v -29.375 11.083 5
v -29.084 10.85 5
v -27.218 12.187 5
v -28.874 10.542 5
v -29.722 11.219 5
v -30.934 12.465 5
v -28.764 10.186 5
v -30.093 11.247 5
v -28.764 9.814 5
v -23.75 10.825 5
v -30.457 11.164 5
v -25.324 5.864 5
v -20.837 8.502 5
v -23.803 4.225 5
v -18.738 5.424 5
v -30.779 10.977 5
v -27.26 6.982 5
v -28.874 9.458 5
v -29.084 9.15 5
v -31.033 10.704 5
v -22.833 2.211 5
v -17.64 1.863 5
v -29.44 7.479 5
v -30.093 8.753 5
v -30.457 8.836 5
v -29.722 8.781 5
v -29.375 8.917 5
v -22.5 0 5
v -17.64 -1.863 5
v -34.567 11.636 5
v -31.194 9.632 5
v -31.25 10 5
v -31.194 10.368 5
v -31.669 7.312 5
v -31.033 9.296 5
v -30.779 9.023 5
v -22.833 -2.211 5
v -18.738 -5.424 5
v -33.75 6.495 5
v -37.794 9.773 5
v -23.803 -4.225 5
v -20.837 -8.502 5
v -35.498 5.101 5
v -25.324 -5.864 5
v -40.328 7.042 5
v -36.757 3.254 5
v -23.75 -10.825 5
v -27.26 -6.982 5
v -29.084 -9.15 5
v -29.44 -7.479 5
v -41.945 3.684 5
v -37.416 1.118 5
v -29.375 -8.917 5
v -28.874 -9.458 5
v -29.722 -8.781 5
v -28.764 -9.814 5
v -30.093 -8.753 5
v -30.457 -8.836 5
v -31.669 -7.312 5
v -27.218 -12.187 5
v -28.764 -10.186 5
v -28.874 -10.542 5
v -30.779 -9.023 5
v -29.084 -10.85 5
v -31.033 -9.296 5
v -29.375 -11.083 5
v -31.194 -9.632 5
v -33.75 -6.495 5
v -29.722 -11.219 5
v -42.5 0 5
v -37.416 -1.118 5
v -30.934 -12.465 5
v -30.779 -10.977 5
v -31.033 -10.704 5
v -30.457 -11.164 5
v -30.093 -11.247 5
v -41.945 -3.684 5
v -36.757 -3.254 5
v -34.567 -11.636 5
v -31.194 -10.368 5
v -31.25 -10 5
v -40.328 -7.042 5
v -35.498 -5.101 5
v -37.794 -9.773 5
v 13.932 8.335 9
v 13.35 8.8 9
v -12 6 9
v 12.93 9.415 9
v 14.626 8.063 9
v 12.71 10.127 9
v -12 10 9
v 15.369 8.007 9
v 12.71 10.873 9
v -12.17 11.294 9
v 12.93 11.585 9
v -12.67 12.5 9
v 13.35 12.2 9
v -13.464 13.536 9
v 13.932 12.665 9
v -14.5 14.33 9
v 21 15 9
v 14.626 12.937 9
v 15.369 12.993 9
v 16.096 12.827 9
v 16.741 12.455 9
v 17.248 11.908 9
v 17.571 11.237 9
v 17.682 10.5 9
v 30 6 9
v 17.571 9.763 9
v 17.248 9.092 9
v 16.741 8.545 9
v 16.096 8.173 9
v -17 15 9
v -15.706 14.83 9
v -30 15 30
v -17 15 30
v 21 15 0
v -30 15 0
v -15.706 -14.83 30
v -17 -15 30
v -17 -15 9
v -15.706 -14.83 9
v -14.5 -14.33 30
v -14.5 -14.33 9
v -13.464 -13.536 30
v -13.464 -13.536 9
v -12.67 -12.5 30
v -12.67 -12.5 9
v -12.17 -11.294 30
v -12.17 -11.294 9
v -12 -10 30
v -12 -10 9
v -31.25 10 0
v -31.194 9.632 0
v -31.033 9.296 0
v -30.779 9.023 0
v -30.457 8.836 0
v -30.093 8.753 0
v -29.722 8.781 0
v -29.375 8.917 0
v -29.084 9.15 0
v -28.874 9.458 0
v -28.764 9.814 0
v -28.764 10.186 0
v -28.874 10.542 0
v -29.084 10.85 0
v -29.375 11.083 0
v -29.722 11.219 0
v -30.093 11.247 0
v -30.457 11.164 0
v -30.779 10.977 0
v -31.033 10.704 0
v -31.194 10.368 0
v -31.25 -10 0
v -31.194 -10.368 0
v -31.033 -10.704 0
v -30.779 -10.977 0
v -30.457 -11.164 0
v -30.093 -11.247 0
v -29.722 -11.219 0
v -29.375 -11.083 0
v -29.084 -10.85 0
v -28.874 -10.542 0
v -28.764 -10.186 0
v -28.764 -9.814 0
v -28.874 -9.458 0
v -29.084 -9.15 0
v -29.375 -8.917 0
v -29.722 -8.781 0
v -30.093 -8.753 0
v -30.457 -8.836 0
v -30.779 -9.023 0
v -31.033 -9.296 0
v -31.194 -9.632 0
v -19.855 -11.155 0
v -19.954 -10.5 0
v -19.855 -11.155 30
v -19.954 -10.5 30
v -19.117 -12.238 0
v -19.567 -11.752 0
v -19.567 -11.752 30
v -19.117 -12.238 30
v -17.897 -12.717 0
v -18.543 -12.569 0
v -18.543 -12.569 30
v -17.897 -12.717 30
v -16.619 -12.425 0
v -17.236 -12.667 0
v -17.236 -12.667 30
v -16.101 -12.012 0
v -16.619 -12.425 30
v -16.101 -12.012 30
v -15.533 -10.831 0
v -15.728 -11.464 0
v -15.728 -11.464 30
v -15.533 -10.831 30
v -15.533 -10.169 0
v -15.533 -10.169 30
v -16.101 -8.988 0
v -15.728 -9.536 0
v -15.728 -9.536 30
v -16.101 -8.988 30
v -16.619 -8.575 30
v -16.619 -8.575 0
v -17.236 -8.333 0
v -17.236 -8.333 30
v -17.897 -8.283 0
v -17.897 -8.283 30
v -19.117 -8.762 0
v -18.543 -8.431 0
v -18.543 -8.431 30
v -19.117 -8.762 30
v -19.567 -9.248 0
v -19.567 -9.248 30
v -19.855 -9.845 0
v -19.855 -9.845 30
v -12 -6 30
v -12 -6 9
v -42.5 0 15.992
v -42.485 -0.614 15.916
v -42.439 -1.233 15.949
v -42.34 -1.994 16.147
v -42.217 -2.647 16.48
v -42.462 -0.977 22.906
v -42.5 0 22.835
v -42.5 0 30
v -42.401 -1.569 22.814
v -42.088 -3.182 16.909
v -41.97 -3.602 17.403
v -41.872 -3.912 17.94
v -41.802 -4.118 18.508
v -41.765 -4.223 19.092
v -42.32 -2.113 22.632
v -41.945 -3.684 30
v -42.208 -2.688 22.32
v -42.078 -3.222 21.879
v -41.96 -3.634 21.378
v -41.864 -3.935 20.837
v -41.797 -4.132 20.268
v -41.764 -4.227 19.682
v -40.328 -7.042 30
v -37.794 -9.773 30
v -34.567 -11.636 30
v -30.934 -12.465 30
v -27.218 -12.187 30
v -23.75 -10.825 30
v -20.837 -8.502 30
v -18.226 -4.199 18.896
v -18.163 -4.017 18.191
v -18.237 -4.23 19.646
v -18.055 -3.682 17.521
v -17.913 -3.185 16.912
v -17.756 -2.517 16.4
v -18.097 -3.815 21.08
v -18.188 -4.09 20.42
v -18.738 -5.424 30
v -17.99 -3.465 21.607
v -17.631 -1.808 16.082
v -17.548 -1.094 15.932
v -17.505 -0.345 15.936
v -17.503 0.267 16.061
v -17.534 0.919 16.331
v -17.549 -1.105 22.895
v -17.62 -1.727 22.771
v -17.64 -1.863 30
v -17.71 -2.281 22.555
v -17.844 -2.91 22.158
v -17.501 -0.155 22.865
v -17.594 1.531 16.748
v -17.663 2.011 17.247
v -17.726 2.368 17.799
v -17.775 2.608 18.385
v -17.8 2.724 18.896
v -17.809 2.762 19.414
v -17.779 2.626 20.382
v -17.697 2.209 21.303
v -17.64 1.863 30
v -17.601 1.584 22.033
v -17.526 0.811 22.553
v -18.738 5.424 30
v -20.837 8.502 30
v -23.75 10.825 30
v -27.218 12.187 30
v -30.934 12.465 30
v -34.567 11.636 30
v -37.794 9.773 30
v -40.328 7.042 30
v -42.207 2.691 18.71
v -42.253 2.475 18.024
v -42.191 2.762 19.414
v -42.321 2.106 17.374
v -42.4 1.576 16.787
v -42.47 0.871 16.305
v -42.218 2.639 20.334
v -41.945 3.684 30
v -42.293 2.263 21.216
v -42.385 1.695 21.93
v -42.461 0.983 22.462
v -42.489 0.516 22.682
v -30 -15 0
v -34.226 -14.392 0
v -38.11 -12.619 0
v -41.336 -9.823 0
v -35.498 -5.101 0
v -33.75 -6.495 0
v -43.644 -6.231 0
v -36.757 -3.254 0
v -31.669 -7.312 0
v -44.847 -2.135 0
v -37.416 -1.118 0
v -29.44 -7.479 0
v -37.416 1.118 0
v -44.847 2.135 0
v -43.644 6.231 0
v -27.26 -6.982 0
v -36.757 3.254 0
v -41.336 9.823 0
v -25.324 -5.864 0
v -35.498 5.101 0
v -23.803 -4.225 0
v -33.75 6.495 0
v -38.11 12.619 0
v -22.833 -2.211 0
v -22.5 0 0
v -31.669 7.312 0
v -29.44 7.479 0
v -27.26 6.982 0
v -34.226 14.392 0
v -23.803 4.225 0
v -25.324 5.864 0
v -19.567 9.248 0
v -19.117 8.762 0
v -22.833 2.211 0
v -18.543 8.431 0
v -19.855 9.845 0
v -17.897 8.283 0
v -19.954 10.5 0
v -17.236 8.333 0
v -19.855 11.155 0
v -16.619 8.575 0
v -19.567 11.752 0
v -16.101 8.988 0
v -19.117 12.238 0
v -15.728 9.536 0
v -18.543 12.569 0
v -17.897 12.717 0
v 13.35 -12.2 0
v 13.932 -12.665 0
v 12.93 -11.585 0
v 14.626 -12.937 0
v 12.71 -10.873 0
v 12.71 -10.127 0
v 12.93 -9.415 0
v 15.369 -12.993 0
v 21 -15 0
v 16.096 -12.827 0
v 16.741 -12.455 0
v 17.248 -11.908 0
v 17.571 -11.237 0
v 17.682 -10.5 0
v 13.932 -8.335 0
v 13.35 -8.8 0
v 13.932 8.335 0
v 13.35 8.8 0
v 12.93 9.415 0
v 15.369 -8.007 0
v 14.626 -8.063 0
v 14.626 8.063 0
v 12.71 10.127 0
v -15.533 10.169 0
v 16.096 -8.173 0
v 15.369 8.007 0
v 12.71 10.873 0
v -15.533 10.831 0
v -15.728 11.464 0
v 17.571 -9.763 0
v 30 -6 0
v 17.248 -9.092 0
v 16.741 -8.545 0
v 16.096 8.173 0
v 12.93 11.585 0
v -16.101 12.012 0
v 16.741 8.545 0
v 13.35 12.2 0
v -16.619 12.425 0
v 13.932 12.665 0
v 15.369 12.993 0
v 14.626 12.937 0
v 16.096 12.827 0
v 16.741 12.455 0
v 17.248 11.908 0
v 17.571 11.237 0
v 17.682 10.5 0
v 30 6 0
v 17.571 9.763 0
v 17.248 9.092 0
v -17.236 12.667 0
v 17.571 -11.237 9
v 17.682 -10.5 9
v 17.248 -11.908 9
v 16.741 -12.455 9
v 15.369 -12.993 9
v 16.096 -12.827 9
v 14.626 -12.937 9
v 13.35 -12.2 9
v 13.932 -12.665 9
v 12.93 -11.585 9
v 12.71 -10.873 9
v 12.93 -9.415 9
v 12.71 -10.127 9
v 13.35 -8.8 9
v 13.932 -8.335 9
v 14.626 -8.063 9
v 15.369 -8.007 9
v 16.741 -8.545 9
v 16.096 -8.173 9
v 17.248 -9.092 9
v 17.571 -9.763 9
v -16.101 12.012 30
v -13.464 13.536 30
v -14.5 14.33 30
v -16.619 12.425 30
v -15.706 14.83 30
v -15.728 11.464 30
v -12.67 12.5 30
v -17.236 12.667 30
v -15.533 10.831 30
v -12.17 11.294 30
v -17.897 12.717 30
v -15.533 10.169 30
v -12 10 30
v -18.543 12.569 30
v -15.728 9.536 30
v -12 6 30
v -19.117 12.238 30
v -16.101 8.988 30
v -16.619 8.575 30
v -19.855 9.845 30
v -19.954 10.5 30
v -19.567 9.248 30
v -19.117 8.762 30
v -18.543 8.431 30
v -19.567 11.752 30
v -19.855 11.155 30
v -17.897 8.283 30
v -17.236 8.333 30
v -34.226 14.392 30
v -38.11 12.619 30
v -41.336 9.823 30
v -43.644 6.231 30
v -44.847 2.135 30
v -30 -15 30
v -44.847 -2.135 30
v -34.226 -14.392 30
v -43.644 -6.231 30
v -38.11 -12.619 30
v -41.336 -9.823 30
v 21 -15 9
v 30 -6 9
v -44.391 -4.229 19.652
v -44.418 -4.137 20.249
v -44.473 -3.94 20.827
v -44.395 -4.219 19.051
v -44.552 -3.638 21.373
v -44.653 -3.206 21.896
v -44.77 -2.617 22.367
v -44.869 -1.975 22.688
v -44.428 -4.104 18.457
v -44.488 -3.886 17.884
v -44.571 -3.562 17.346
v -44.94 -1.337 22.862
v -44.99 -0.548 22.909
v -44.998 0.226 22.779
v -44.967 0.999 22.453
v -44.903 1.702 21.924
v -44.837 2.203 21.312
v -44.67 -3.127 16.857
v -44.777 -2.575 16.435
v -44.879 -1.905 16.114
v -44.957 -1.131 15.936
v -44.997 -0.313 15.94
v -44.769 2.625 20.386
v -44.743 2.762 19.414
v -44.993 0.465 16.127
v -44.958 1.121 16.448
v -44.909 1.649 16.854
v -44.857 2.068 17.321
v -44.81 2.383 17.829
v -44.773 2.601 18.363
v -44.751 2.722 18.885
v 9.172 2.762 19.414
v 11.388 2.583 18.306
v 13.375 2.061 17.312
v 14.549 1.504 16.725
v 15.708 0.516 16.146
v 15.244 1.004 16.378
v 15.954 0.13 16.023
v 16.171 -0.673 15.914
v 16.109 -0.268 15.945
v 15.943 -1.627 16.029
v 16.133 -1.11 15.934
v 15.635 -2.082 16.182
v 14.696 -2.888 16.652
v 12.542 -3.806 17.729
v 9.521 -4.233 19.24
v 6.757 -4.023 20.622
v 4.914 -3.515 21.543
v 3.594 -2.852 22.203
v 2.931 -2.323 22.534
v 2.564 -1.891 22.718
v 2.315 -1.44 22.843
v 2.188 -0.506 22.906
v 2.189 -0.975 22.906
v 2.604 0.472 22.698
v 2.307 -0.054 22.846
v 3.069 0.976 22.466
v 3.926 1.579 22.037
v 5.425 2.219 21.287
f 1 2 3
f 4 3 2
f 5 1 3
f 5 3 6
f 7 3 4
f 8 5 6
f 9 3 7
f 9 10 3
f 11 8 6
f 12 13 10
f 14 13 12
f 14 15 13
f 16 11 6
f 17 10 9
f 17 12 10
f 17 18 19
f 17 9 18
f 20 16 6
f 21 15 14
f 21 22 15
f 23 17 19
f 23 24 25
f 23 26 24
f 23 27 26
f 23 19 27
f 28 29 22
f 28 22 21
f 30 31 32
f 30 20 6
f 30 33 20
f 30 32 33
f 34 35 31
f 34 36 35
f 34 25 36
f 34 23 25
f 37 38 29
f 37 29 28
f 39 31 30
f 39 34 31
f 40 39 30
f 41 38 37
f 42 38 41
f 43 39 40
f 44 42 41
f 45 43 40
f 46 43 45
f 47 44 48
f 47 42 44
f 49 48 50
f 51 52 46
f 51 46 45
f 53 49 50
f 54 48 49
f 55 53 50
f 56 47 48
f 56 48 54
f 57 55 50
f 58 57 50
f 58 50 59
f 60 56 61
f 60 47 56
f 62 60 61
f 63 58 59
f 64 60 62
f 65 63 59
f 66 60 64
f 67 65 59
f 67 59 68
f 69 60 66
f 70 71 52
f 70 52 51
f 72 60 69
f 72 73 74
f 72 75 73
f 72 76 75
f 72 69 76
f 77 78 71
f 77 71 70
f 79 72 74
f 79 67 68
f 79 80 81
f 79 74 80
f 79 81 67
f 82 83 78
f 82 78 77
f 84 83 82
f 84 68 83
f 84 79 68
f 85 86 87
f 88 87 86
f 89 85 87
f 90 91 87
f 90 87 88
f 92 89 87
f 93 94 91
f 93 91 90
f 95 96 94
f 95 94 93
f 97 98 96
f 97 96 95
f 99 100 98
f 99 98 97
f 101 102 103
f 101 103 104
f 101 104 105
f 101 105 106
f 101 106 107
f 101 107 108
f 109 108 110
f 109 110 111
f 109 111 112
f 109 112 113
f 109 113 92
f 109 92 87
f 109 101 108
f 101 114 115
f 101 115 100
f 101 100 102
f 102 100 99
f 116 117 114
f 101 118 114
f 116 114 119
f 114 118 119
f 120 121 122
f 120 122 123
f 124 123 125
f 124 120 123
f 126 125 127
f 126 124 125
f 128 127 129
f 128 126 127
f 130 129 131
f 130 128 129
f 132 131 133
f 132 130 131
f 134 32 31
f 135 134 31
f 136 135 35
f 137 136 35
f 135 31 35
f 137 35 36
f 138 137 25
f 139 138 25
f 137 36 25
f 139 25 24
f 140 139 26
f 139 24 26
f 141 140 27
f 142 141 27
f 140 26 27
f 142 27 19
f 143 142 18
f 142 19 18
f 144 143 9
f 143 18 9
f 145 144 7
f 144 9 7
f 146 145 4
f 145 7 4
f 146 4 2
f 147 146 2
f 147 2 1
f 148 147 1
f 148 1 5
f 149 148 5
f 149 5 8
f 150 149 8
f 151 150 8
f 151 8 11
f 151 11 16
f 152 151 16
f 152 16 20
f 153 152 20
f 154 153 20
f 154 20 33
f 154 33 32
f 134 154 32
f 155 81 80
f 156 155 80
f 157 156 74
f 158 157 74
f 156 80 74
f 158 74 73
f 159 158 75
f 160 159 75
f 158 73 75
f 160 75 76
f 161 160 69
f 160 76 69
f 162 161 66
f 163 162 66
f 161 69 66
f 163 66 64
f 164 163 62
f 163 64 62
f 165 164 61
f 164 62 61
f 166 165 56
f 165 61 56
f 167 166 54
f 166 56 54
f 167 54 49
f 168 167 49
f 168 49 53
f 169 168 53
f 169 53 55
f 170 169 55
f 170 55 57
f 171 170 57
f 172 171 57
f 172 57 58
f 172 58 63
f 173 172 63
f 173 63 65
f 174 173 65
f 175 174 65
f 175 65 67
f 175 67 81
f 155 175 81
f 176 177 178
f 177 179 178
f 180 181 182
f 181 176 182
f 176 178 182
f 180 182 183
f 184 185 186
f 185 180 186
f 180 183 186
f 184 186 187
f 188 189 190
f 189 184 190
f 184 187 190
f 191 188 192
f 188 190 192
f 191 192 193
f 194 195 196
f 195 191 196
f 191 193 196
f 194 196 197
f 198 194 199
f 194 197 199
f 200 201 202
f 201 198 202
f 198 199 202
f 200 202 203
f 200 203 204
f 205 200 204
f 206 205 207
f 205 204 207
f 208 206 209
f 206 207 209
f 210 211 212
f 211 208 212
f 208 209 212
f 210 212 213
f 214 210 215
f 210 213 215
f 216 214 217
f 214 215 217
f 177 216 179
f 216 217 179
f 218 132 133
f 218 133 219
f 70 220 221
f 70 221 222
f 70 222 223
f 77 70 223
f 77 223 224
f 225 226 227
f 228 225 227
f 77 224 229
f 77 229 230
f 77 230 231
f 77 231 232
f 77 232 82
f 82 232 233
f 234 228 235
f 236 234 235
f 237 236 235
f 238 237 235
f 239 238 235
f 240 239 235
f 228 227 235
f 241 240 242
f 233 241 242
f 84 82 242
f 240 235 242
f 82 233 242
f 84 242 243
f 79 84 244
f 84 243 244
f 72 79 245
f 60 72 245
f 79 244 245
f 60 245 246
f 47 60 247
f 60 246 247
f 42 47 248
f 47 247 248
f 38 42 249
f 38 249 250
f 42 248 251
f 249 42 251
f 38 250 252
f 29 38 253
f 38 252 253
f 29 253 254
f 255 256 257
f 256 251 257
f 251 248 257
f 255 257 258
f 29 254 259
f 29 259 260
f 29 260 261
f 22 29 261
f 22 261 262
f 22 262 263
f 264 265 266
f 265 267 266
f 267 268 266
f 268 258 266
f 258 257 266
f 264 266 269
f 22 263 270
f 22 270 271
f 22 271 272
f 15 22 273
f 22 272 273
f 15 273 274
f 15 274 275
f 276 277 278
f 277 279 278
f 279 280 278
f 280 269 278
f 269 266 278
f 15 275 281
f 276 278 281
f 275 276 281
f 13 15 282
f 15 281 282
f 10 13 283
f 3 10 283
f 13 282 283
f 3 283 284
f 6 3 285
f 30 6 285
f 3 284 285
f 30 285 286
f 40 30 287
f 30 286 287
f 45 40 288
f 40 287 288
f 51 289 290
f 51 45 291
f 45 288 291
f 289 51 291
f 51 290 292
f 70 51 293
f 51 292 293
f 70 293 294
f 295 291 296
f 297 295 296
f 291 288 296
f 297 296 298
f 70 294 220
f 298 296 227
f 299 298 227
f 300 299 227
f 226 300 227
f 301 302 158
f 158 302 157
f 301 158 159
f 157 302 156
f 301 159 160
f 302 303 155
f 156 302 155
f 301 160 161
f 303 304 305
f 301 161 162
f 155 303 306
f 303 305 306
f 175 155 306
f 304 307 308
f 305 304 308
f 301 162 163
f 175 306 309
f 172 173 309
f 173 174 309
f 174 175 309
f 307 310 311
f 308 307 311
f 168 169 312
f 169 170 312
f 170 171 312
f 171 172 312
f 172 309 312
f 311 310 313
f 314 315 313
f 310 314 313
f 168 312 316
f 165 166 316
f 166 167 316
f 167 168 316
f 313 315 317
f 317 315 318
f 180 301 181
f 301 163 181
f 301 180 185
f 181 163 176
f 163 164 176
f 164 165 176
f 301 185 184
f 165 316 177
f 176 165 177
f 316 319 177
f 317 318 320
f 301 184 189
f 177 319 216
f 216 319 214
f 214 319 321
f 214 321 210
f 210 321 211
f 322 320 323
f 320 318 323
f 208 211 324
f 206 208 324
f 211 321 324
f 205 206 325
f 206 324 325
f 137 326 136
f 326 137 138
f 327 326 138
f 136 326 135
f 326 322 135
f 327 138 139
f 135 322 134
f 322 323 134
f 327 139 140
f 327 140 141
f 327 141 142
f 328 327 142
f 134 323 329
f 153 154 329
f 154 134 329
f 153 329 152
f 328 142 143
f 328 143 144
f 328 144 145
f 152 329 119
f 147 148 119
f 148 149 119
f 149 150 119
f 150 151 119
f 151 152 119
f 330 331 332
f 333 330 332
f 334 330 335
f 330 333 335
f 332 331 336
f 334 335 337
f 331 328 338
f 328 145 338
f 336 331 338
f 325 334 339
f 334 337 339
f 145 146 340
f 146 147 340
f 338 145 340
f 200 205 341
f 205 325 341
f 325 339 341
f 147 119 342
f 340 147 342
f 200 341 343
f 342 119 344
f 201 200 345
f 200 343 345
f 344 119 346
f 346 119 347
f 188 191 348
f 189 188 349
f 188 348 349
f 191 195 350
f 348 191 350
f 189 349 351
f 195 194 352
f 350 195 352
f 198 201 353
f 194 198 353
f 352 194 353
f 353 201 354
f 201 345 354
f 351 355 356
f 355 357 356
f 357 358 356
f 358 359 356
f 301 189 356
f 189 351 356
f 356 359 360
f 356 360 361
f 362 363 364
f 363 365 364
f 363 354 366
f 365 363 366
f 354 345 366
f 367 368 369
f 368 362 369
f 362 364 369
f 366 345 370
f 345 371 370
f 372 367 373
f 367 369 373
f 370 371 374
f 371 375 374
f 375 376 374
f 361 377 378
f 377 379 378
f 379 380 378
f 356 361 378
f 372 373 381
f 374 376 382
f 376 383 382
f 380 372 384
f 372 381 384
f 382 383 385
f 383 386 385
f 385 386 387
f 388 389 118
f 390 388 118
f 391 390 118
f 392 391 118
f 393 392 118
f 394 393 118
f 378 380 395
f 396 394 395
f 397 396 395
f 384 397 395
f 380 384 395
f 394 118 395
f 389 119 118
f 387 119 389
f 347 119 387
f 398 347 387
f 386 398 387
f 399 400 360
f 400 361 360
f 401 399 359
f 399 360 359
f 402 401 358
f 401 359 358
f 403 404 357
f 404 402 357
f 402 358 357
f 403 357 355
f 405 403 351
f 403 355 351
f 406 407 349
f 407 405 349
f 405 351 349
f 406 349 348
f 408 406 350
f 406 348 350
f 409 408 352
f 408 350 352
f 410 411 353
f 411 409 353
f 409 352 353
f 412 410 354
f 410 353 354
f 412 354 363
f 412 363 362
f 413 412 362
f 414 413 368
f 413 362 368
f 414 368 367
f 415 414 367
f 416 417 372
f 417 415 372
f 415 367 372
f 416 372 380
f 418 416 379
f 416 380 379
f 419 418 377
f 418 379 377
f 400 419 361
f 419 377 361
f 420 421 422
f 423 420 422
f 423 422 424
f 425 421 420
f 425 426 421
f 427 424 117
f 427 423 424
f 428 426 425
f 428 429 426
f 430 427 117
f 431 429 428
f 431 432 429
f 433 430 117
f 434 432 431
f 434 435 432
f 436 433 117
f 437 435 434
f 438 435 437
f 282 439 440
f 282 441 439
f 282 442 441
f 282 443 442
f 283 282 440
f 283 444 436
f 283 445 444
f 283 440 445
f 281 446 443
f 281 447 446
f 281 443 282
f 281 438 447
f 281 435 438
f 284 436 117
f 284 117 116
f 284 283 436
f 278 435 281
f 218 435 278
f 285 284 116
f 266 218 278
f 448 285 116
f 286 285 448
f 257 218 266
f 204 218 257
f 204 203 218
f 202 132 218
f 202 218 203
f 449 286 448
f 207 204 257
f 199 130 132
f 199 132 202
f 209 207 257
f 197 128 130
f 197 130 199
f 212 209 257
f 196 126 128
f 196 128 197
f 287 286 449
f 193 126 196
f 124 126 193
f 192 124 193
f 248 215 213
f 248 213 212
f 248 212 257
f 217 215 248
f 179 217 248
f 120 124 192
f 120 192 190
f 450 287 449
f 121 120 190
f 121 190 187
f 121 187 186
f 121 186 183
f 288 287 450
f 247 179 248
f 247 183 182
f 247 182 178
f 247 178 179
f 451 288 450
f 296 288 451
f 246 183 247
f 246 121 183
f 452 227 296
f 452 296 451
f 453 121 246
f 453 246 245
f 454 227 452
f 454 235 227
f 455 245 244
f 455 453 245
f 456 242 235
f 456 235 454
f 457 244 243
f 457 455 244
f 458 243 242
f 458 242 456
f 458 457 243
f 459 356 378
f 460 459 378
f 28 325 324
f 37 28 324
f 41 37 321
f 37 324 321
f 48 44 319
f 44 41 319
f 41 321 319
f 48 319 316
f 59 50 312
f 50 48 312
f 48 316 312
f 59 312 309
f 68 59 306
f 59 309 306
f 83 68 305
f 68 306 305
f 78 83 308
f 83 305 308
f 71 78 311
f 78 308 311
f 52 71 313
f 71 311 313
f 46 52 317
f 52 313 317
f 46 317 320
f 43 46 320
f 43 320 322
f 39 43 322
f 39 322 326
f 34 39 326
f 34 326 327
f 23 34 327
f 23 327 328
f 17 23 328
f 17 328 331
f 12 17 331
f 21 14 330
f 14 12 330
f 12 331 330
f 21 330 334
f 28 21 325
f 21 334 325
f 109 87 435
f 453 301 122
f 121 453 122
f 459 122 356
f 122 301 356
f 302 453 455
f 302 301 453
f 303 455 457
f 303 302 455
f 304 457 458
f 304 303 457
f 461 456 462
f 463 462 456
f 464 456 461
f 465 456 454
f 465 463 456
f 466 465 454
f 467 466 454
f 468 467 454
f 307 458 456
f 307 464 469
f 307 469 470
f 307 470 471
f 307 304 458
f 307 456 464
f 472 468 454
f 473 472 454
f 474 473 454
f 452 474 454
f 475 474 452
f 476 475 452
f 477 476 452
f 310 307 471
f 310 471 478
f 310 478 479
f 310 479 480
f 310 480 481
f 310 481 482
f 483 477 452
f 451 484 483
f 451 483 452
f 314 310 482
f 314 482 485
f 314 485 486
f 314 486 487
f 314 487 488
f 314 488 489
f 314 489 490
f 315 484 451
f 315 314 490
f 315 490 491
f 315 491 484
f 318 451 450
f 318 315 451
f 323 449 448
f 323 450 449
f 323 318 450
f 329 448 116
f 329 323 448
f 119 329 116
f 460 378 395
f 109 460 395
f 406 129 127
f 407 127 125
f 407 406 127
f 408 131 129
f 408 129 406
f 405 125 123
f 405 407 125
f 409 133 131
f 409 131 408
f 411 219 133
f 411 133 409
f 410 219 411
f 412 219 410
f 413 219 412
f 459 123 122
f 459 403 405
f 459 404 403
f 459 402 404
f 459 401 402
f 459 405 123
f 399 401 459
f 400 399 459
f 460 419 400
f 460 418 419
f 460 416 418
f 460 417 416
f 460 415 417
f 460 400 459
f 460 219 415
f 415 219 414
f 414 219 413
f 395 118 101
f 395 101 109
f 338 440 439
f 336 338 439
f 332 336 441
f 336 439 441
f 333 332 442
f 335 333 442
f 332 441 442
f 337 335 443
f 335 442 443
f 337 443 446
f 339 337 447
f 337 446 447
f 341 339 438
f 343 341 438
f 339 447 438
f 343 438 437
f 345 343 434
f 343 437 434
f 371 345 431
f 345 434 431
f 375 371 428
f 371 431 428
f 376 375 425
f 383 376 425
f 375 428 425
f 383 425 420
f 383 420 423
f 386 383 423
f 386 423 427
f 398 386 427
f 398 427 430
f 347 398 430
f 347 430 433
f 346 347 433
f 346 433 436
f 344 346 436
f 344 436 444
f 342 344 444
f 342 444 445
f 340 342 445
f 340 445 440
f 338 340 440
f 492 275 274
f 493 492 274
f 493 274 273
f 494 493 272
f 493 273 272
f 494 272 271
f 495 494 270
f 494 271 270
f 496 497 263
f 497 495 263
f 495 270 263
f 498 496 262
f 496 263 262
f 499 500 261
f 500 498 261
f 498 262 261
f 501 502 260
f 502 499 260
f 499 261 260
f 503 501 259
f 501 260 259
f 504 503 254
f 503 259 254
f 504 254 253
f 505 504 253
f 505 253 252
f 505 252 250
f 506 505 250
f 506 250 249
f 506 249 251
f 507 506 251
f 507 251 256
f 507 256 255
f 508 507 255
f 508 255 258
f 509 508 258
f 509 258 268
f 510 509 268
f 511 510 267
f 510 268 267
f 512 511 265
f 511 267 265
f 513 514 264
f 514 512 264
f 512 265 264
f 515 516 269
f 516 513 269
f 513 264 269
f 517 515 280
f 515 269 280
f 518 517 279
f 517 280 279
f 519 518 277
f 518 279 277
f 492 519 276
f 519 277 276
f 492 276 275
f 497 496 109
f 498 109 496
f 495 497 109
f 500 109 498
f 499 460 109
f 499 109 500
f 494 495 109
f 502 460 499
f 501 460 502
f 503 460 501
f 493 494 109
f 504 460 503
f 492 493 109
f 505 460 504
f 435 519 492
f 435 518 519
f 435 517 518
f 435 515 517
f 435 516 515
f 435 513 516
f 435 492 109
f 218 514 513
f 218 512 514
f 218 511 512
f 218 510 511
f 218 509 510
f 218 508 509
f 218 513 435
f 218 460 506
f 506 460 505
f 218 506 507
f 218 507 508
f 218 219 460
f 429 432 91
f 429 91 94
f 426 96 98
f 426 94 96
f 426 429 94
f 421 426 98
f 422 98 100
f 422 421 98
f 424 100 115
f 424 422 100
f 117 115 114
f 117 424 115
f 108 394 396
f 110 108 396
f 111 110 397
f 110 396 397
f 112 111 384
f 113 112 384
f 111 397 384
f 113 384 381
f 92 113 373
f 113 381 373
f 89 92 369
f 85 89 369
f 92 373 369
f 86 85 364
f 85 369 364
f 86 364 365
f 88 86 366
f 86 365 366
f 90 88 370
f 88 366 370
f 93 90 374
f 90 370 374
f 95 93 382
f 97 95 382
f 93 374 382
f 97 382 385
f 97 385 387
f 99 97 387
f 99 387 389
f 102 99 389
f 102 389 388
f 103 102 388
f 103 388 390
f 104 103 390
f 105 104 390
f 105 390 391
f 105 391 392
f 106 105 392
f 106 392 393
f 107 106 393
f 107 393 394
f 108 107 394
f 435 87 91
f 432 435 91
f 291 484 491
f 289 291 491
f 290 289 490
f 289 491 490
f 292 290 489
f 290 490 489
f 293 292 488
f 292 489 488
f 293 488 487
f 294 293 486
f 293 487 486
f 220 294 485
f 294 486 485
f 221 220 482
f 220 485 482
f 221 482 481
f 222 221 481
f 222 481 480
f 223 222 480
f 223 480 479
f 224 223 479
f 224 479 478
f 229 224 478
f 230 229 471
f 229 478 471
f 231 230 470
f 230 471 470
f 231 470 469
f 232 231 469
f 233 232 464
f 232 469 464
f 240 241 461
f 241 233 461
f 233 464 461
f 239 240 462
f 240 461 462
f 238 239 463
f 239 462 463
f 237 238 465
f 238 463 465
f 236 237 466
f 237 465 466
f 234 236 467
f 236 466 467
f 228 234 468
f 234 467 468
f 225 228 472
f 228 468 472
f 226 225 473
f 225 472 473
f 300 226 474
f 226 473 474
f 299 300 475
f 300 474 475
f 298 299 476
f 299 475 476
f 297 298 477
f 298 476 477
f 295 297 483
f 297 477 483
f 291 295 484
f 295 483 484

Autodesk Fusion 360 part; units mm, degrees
sketch "Sketch1" plane through (0, 0, 0) normal (0, 1, 0) x (1, 0, 0)
sketch "Sketch2" plane through (0, 0, 0) normal (0, 0, 1) x (1, 0, 0)
  line L0 (30, 15) -> (-30, 15)
  line L1 (-30, 15) -> (-30, -15)
  line L2 (-30, -15) -> (30, -15)
  line L3 (30, -15) -> (30, 15)
  line L4 (30, 15) -> (-30, -15) construction
  line L5 (-30, 15) -> (30, -15) construction
  arc A0 (-30, 15) -> (-30, -15) centre (-30, 0) ccw
  circle A1 centre (-30, 0) radius 7.5
  line L6 (21, -15) -> (30, -6)
  line L7 (21, 15) -> (30, 6)
  dimension "d1" = 60
  dimension "d2" = 30
  dimension "d3" = 15
  dimension "d4" = 9
  dimension "d5" = 9
  dimension "d6" = 9
  dimension "d7" = 9
extrude "Extrude1" add sketch "Sketch2" along normal blind 9 contours L0 L1 L2 L3 A1 L6 L7 | L1 A0 A1
sketch "Sketch3" plane through (0, 0, 9) normal (0, 0, 1) x (-1, 0, 0)
  circle A0 centre (30, 0) radius 7.5
  arc A1 (30, -15) -> (30, 15) centre (30, 0) ccw
  line L0 (30, 15) -> (-21, 15)
  line L1 (-21, 15) -> (-30, 6)
  line L2 (-30, 6) -> (-30, -6)
  line L3 (-30, -6) -> (-21, -15)
  line L4 (-21, -15) -> (30, -15)
  line L5 (12, 15) -> (12, -15)
  dimension "d10" = 18
extrude "Extrude2" add sketch "Sketch3" along normal blind 21 contours A1 L0 L4 L5
sketch "Sketch4" plane through (0, 0, 0) normal (0, 1, 0) x (1, 0, 0)
  line L0 (30, -9) -> (-12, -30)
  line L1 (-12, -30) -> (-12, -9)
  line L2 (-12, -9) -> (30, -9)
extrude "Extrude3" add sketch "Sketch4" along normal mid plane 12
sketch "Sketch5" plane through (0, 0, 30) normal (0, 0, 1) x (-1, 0, 0)
  circle A0 centre (30, 0) radius 7.5
  line L0 (12, 15) -> (12, 6)
  line L1 (12, 6) -> (12, -6)
  line L2 (12, -6) -> (12, -15)
  line L3 (12, -15) -> (30, -15)
  arc A1 (30, -15) -> (30, 15) centre (30, 0) ccw
  line L4 (30, 15) -> (12, 15)
  circle A2 centre (17.7307, -10.5) radius 2.2228
  circle A3 centre (17.7307, -10.5) radius 2.5
  dimension "d15" = 5
extrude "Extrude4" cut sketch "Sketch5" against normal blind 30 contours A2
mirror "Mirror1" about plane through (0, 0, 0) normal (0, 1, 0) of "Extrude4"
sketch "Sketch6" plane through (0, 0, 30) normal (0, 0, 1) x (-1, 0, 0)
  circle A0 centre (17.7307, 10.5) radius 2.2228
  circle A1 centre (17.7307, -10.5) radius 2.2228
  circle A2 centre (30, 0) radius 7.5
  line L0 (12, 15) -> (12, 6)
  line L1 (12, 6) -> (12, -6)
  line L2 (12, -6) -> (12, -15)
  line L3 (12, -15) -> (30, -15)
  arc A3 (30, -15) -> (30, 15) centre (30, 0) ccw
  line L4 (30, 15) -> (12, 15)
  circle A4 centre (30, 0) radius 12.5
  dimension "d20" = 25
extrude "Extrude5" cut sketch "Sketch6" against normal blind 25 contours A4
sketch "Sketch7" plane through (0, 0, 5) normal (0, 0, 1) x (-1, 0, 0)
  circle A0 centre (30, 0) radius 7.5
  circle A1 centre (30, 0) radius 12.5
  circle A2 centre (30, 10) radius 1.25
  dimension "d23" = 2.5
extrude "Extrude6" cut sketch "Sketch7" against normal blind 5 contours A2
sketch "Sketch8" plane through (0, 0, 5) normal (0, 0, 1) x (-1, 0, 0)
  circle A0 centre (30, 10) radius 1.25
  circle A1 centre (30, 0) radius 7.5
  circle A2 centre (30, 0) radius 12.5
  circle A3 centre (30, -10) radius 1.25
  dimension "d26" = 2.5
extrude "Extrude7" cut sketch "Sketch8" against normal blind 5 contours A3
sketch "Sketch9" plane through (0, 0, 0) normal (0, 0, -1) x (1, 0, 0)
  circle A0 centre (-30, -10) radius 1.25
  circle A1 centre (-30, 10) radius 1.25
  circle A2 centre (-17.7307, 10.5) radius 2.2228
  circle A3 centre (-17.7307, -10.5) radius 2.2228
  circle A4 centre (-30, 0) radius 7.5
  arc A5 (-30, 15) -> (-30, -15) centre (-30, 0) ccw
  line L0 (-30, -15) -> (21, -15)
  line L1 (21, -15) -> (30, -6)
  line L2 (30, -6) -> (30, 6)
  line L3 (30, 6) -> (21, 15)
  line L4 (21, 15) -> (-30, 15)
  circle A6 centre (15.1822, -10.5) radius 2.5
  circle A7 centre (15, 10) radius 2.5
  dimension "d29" = 5
  dimension "d30" = 5
extrude "Extrude8" cut sketch "Sketch9" against normal blind 9 contours A6
mirror "Mirror2" about plane through (0, 0, 0) normal (0, 1, 0) of "Extrude8"
sketch "Sketch10" plane through (0, 0, 0) normal (0, 0, 1) x (1, 0, 0)
fillet "Fillet1" radius 5 1 edges at (-12, 15, 19.5)
fillet "Fillet2" radius 5 1 edges at (-12, -15, 19.5)
ref_plane "WorkPlane1" through (-57, -8, 19.5) normal (1, 0, 0) x (0, 1, 0)
sketch "Sketch11" plane through (-57, -8, 19.5) normal (1, 0, 0) x (0, 1, 0)
  circle A0 centre (7.2624, -0.0862) radius 3.5
  dimension "d40" = 7
extrude "Extrude9" cut sketch "Sketch11" along normal blind 75
